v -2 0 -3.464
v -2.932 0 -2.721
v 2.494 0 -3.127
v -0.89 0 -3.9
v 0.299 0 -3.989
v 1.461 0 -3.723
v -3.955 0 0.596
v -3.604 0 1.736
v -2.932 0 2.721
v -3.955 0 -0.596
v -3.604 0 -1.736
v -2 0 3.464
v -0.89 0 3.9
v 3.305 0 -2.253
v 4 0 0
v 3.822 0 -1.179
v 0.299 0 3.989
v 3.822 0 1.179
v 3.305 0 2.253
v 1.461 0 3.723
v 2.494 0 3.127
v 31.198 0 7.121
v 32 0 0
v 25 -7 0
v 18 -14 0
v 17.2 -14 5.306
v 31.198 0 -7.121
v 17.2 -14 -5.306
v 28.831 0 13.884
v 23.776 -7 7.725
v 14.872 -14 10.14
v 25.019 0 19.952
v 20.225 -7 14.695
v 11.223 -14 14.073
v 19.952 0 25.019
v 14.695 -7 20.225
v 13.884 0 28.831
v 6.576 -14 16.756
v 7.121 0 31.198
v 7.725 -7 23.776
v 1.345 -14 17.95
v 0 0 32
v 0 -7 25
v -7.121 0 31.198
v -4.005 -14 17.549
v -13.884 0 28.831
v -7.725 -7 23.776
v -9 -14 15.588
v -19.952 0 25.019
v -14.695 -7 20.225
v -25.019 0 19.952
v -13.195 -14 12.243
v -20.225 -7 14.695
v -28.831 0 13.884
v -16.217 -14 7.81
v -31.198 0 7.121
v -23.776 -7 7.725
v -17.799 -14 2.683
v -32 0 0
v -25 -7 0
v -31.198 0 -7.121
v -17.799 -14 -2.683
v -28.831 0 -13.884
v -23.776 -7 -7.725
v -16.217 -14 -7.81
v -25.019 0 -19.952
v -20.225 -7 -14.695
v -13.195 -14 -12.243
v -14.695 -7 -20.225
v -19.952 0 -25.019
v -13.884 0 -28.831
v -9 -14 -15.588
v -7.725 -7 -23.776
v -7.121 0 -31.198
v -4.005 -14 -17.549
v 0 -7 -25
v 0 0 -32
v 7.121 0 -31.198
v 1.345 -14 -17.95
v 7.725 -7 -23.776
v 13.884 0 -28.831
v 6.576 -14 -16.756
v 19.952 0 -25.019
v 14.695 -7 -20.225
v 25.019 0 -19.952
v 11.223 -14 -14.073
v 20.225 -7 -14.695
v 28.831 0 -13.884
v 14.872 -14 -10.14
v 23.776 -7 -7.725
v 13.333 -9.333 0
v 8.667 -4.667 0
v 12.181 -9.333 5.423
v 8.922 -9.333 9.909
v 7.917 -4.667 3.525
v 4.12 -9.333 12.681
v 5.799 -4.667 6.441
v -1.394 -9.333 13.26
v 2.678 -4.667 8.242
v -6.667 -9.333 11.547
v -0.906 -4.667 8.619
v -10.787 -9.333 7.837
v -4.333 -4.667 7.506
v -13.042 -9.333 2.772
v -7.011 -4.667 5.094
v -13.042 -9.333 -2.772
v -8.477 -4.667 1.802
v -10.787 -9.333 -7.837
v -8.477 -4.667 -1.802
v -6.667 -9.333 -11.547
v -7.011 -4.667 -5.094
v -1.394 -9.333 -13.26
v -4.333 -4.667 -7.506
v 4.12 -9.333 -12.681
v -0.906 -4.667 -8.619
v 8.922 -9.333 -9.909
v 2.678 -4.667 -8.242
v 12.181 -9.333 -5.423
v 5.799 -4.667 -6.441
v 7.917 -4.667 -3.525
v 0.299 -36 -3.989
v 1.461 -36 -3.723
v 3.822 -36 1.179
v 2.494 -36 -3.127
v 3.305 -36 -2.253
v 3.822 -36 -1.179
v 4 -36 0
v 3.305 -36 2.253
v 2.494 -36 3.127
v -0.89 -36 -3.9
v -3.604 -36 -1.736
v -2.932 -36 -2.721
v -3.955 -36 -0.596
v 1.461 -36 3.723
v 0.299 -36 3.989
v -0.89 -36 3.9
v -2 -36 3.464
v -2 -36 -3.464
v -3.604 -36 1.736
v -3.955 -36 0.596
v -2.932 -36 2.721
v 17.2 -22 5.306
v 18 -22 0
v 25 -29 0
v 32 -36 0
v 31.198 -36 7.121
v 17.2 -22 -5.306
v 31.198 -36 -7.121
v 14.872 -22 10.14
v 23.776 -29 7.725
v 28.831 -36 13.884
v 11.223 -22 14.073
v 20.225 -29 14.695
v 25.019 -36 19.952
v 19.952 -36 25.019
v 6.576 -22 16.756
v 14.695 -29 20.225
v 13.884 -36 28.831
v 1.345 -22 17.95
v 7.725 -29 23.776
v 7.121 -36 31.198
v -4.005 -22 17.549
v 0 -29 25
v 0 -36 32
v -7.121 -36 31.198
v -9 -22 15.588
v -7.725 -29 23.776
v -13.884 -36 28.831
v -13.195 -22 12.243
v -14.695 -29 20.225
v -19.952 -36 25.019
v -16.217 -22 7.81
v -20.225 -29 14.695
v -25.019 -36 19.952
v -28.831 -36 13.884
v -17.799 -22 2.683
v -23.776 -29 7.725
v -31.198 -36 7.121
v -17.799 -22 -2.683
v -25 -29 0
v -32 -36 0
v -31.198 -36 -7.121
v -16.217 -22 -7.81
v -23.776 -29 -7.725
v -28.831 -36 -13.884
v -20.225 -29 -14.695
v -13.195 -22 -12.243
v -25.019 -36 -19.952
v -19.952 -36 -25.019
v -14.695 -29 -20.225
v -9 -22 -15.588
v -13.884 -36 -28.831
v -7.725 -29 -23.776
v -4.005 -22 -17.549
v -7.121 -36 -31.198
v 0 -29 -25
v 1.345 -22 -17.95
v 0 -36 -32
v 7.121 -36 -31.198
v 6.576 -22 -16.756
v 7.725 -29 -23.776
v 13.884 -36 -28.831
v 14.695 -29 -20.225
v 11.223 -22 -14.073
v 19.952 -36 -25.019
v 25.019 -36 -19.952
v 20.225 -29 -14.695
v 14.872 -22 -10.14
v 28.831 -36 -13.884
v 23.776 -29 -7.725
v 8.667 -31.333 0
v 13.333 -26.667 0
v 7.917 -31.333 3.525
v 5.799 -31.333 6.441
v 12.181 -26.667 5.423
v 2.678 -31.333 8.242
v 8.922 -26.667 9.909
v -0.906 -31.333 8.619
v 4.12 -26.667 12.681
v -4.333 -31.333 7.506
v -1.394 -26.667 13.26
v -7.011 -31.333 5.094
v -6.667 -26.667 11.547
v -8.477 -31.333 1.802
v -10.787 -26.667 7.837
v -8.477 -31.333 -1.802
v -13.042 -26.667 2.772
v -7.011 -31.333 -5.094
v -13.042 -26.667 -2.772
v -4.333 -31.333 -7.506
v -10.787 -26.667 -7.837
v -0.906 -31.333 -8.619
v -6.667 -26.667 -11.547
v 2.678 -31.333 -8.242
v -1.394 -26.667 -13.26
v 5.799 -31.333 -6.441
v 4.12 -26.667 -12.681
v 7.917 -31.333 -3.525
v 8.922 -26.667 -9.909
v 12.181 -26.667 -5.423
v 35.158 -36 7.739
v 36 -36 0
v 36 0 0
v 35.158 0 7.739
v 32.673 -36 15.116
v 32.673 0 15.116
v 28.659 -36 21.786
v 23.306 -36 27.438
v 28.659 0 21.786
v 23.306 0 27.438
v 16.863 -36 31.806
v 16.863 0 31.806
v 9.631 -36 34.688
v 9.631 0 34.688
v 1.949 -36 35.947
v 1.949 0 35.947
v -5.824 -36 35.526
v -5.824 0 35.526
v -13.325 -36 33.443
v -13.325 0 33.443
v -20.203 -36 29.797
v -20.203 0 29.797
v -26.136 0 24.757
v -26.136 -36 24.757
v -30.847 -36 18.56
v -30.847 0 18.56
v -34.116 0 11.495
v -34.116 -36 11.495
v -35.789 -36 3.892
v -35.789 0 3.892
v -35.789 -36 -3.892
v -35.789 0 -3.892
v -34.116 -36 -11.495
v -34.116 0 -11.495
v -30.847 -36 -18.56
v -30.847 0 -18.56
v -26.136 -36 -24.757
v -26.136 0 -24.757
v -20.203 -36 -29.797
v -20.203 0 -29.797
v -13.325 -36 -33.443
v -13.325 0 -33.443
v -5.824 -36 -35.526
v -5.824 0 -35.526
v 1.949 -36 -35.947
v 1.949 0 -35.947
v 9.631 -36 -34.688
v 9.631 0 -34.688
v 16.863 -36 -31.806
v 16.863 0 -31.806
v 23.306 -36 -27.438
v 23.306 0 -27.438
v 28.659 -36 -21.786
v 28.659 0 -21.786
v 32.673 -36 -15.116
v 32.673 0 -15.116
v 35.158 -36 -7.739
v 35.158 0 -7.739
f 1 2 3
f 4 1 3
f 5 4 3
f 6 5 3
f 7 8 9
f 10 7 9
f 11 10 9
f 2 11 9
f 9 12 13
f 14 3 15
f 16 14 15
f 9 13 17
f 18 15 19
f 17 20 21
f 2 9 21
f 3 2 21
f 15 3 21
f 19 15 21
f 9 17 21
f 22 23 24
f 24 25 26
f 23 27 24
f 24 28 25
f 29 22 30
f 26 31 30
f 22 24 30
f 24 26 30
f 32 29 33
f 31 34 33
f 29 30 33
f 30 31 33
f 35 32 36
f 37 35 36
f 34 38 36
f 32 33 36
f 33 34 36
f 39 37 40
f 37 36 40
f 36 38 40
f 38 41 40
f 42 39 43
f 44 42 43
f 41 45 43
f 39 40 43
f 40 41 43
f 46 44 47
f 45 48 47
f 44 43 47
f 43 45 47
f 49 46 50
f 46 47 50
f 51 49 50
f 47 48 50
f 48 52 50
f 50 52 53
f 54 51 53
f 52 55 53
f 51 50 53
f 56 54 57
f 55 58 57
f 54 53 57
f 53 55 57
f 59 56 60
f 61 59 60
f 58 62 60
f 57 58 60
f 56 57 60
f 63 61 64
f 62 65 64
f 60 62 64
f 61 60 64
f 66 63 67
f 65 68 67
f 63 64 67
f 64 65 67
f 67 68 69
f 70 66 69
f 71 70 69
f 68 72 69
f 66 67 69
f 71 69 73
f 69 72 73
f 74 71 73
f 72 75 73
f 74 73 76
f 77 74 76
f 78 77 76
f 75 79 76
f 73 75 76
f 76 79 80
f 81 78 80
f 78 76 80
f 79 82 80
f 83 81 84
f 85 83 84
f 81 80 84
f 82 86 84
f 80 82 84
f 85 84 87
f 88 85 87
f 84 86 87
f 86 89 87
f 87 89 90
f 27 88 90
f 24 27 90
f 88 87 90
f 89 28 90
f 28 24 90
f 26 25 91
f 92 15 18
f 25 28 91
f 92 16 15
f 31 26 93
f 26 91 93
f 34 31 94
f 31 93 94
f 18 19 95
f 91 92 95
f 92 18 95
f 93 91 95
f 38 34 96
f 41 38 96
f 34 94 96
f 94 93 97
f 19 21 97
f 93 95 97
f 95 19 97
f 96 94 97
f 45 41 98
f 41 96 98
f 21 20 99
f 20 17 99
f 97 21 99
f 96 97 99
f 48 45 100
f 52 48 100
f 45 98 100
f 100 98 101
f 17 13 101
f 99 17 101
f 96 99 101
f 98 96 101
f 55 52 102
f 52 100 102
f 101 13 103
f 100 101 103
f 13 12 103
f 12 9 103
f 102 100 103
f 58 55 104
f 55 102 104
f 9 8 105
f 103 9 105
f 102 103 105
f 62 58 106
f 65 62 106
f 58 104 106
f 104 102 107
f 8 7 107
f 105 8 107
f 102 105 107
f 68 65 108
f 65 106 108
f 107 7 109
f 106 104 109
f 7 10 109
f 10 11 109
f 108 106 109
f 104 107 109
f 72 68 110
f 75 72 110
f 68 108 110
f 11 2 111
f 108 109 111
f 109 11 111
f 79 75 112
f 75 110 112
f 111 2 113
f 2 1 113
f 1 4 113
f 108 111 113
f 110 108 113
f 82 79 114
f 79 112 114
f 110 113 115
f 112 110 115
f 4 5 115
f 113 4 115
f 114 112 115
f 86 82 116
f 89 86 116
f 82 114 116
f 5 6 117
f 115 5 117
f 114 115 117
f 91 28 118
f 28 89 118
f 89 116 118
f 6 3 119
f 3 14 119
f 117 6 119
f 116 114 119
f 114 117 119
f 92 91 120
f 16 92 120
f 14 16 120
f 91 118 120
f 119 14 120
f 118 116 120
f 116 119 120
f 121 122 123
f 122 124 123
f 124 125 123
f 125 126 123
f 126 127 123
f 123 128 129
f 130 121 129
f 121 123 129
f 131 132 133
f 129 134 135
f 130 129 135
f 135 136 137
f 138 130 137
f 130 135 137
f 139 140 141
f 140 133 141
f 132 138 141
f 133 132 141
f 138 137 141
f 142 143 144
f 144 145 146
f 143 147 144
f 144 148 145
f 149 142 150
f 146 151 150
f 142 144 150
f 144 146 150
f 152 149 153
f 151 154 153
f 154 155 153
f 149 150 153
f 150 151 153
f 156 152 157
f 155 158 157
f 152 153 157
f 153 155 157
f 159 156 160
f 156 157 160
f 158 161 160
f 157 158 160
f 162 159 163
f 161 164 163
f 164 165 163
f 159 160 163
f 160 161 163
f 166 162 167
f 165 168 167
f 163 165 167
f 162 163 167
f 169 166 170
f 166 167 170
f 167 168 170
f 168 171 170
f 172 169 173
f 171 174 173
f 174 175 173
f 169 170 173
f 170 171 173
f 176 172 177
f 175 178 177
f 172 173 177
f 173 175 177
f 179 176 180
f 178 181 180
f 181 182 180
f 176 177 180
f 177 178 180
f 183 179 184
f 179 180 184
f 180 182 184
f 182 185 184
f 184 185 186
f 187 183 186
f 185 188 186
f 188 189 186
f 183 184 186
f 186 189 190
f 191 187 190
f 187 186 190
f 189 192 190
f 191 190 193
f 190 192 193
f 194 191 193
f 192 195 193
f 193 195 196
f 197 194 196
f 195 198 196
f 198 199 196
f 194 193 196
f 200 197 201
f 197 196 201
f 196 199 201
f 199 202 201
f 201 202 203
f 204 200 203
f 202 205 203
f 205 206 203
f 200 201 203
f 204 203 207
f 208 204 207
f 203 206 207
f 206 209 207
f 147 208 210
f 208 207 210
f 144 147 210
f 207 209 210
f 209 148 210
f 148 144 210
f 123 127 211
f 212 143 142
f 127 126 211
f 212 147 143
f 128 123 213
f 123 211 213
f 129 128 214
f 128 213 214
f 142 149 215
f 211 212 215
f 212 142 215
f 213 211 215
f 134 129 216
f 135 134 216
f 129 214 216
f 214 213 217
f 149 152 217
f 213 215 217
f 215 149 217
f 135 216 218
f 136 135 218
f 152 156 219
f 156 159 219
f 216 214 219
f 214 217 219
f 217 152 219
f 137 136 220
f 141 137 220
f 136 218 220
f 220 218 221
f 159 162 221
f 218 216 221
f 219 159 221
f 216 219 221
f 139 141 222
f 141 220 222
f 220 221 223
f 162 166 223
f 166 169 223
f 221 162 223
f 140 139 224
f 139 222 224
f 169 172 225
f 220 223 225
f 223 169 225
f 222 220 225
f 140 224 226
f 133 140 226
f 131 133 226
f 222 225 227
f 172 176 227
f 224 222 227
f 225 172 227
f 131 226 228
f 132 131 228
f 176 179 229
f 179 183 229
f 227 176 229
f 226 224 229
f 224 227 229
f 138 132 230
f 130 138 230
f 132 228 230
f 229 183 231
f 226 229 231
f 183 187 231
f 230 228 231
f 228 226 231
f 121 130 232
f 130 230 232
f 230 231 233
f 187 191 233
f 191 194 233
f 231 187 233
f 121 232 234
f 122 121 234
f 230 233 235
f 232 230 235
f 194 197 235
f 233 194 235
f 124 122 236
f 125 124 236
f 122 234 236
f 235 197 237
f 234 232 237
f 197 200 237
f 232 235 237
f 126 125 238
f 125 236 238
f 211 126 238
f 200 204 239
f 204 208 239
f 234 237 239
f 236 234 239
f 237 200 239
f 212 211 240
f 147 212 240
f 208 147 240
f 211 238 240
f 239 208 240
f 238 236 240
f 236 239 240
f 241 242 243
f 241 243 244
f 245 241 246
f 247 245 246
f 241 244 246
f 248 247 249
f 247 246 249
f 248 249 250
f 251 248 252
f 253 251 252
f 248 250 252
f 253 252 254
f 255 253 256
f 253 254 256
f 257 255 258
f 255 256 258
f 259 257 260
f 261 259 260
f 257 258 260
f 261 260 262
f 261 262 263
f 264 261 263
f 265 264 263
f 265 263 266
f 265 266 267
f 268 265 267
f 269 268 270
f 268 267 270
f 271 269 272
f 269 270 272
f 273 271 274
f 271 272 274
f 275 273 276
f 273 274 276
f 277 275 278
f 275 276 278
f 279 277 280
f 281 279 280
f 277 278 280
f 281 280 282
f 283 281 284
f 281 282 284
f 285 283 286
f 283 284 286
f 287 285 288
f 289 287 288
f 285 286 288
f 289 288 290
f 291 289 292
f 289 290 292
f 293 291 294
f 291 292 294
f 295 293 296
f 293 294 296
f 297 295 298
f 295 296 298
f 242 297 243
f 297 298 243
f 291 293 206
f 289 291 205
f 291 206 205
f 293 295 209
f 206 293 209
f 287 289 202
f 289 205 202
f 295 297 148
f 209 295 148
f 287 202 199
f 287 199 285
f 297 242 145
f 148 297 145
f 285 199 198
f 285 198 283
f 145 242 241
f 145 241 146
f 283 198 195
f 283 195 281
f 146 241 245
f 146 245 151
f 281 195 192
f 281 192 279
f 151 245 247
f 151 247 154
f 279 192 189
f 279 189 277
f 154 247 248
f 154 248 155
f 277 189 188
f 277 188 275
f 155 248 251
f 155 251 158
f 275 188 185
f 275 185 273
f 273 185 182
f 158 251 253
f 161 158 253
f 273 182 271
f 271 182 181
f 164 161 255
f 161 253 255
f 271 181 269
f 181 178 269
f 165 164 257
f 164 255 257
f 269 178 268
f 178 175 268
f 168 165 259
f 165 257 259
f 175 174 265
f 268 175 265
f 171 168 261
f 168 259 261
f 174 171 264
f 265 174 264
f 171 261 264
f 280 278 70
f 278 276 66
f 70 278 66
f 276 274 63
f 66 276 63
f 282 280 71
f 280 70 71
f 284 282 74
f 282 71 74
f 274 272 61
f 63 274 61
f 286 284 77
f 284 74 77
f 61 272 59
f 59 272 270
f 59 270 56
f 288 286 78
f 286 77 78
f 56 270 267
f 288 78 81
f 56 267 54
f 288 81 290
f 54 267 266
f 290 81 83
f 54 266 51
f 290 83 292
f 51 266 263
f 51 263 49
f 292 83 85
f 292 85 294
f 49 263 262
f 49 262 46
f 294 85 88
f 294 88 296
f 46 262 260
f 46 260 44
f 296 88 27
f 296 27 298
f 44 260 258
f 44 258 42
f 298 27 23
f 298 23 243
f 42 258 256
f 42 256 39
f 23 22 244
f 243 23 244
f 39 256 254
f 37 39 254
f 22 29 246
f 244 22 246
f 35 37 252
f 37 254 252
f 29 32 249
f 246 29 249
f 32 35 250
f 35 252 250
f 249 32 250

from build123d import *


with BuildPart() as f1:
    # F0 (on Top) → F1 (revolve)
    with BuildSketch(Plane.XY):
        Polygon((4, 0), (0, 0), (0, -36), (4, -36), (18, -22), (32, -36), (36, -36), (36, 0), (32, 0), (18, -14), align=None)
        Polygon((16.343146, -18), (4, -30.343146), (4, -5.656854), align=None, mode=Mode.SUBTRACT)
        Polygon((32, -30.343146), (19.656854, -18), (32, -5.656854), align=None, mode=Mode.SUBTRACT)
        Polygon((4, -5.656854), (4, -30.343146), (16.343146, -18), align=None)
        Polygon((32, -5.656854), (19.656854, -18), (32, -30.343146), align=None)
    revolve(axis=Axis((0, -18, 0), (0, -1, 0)))


solid = f1.part
